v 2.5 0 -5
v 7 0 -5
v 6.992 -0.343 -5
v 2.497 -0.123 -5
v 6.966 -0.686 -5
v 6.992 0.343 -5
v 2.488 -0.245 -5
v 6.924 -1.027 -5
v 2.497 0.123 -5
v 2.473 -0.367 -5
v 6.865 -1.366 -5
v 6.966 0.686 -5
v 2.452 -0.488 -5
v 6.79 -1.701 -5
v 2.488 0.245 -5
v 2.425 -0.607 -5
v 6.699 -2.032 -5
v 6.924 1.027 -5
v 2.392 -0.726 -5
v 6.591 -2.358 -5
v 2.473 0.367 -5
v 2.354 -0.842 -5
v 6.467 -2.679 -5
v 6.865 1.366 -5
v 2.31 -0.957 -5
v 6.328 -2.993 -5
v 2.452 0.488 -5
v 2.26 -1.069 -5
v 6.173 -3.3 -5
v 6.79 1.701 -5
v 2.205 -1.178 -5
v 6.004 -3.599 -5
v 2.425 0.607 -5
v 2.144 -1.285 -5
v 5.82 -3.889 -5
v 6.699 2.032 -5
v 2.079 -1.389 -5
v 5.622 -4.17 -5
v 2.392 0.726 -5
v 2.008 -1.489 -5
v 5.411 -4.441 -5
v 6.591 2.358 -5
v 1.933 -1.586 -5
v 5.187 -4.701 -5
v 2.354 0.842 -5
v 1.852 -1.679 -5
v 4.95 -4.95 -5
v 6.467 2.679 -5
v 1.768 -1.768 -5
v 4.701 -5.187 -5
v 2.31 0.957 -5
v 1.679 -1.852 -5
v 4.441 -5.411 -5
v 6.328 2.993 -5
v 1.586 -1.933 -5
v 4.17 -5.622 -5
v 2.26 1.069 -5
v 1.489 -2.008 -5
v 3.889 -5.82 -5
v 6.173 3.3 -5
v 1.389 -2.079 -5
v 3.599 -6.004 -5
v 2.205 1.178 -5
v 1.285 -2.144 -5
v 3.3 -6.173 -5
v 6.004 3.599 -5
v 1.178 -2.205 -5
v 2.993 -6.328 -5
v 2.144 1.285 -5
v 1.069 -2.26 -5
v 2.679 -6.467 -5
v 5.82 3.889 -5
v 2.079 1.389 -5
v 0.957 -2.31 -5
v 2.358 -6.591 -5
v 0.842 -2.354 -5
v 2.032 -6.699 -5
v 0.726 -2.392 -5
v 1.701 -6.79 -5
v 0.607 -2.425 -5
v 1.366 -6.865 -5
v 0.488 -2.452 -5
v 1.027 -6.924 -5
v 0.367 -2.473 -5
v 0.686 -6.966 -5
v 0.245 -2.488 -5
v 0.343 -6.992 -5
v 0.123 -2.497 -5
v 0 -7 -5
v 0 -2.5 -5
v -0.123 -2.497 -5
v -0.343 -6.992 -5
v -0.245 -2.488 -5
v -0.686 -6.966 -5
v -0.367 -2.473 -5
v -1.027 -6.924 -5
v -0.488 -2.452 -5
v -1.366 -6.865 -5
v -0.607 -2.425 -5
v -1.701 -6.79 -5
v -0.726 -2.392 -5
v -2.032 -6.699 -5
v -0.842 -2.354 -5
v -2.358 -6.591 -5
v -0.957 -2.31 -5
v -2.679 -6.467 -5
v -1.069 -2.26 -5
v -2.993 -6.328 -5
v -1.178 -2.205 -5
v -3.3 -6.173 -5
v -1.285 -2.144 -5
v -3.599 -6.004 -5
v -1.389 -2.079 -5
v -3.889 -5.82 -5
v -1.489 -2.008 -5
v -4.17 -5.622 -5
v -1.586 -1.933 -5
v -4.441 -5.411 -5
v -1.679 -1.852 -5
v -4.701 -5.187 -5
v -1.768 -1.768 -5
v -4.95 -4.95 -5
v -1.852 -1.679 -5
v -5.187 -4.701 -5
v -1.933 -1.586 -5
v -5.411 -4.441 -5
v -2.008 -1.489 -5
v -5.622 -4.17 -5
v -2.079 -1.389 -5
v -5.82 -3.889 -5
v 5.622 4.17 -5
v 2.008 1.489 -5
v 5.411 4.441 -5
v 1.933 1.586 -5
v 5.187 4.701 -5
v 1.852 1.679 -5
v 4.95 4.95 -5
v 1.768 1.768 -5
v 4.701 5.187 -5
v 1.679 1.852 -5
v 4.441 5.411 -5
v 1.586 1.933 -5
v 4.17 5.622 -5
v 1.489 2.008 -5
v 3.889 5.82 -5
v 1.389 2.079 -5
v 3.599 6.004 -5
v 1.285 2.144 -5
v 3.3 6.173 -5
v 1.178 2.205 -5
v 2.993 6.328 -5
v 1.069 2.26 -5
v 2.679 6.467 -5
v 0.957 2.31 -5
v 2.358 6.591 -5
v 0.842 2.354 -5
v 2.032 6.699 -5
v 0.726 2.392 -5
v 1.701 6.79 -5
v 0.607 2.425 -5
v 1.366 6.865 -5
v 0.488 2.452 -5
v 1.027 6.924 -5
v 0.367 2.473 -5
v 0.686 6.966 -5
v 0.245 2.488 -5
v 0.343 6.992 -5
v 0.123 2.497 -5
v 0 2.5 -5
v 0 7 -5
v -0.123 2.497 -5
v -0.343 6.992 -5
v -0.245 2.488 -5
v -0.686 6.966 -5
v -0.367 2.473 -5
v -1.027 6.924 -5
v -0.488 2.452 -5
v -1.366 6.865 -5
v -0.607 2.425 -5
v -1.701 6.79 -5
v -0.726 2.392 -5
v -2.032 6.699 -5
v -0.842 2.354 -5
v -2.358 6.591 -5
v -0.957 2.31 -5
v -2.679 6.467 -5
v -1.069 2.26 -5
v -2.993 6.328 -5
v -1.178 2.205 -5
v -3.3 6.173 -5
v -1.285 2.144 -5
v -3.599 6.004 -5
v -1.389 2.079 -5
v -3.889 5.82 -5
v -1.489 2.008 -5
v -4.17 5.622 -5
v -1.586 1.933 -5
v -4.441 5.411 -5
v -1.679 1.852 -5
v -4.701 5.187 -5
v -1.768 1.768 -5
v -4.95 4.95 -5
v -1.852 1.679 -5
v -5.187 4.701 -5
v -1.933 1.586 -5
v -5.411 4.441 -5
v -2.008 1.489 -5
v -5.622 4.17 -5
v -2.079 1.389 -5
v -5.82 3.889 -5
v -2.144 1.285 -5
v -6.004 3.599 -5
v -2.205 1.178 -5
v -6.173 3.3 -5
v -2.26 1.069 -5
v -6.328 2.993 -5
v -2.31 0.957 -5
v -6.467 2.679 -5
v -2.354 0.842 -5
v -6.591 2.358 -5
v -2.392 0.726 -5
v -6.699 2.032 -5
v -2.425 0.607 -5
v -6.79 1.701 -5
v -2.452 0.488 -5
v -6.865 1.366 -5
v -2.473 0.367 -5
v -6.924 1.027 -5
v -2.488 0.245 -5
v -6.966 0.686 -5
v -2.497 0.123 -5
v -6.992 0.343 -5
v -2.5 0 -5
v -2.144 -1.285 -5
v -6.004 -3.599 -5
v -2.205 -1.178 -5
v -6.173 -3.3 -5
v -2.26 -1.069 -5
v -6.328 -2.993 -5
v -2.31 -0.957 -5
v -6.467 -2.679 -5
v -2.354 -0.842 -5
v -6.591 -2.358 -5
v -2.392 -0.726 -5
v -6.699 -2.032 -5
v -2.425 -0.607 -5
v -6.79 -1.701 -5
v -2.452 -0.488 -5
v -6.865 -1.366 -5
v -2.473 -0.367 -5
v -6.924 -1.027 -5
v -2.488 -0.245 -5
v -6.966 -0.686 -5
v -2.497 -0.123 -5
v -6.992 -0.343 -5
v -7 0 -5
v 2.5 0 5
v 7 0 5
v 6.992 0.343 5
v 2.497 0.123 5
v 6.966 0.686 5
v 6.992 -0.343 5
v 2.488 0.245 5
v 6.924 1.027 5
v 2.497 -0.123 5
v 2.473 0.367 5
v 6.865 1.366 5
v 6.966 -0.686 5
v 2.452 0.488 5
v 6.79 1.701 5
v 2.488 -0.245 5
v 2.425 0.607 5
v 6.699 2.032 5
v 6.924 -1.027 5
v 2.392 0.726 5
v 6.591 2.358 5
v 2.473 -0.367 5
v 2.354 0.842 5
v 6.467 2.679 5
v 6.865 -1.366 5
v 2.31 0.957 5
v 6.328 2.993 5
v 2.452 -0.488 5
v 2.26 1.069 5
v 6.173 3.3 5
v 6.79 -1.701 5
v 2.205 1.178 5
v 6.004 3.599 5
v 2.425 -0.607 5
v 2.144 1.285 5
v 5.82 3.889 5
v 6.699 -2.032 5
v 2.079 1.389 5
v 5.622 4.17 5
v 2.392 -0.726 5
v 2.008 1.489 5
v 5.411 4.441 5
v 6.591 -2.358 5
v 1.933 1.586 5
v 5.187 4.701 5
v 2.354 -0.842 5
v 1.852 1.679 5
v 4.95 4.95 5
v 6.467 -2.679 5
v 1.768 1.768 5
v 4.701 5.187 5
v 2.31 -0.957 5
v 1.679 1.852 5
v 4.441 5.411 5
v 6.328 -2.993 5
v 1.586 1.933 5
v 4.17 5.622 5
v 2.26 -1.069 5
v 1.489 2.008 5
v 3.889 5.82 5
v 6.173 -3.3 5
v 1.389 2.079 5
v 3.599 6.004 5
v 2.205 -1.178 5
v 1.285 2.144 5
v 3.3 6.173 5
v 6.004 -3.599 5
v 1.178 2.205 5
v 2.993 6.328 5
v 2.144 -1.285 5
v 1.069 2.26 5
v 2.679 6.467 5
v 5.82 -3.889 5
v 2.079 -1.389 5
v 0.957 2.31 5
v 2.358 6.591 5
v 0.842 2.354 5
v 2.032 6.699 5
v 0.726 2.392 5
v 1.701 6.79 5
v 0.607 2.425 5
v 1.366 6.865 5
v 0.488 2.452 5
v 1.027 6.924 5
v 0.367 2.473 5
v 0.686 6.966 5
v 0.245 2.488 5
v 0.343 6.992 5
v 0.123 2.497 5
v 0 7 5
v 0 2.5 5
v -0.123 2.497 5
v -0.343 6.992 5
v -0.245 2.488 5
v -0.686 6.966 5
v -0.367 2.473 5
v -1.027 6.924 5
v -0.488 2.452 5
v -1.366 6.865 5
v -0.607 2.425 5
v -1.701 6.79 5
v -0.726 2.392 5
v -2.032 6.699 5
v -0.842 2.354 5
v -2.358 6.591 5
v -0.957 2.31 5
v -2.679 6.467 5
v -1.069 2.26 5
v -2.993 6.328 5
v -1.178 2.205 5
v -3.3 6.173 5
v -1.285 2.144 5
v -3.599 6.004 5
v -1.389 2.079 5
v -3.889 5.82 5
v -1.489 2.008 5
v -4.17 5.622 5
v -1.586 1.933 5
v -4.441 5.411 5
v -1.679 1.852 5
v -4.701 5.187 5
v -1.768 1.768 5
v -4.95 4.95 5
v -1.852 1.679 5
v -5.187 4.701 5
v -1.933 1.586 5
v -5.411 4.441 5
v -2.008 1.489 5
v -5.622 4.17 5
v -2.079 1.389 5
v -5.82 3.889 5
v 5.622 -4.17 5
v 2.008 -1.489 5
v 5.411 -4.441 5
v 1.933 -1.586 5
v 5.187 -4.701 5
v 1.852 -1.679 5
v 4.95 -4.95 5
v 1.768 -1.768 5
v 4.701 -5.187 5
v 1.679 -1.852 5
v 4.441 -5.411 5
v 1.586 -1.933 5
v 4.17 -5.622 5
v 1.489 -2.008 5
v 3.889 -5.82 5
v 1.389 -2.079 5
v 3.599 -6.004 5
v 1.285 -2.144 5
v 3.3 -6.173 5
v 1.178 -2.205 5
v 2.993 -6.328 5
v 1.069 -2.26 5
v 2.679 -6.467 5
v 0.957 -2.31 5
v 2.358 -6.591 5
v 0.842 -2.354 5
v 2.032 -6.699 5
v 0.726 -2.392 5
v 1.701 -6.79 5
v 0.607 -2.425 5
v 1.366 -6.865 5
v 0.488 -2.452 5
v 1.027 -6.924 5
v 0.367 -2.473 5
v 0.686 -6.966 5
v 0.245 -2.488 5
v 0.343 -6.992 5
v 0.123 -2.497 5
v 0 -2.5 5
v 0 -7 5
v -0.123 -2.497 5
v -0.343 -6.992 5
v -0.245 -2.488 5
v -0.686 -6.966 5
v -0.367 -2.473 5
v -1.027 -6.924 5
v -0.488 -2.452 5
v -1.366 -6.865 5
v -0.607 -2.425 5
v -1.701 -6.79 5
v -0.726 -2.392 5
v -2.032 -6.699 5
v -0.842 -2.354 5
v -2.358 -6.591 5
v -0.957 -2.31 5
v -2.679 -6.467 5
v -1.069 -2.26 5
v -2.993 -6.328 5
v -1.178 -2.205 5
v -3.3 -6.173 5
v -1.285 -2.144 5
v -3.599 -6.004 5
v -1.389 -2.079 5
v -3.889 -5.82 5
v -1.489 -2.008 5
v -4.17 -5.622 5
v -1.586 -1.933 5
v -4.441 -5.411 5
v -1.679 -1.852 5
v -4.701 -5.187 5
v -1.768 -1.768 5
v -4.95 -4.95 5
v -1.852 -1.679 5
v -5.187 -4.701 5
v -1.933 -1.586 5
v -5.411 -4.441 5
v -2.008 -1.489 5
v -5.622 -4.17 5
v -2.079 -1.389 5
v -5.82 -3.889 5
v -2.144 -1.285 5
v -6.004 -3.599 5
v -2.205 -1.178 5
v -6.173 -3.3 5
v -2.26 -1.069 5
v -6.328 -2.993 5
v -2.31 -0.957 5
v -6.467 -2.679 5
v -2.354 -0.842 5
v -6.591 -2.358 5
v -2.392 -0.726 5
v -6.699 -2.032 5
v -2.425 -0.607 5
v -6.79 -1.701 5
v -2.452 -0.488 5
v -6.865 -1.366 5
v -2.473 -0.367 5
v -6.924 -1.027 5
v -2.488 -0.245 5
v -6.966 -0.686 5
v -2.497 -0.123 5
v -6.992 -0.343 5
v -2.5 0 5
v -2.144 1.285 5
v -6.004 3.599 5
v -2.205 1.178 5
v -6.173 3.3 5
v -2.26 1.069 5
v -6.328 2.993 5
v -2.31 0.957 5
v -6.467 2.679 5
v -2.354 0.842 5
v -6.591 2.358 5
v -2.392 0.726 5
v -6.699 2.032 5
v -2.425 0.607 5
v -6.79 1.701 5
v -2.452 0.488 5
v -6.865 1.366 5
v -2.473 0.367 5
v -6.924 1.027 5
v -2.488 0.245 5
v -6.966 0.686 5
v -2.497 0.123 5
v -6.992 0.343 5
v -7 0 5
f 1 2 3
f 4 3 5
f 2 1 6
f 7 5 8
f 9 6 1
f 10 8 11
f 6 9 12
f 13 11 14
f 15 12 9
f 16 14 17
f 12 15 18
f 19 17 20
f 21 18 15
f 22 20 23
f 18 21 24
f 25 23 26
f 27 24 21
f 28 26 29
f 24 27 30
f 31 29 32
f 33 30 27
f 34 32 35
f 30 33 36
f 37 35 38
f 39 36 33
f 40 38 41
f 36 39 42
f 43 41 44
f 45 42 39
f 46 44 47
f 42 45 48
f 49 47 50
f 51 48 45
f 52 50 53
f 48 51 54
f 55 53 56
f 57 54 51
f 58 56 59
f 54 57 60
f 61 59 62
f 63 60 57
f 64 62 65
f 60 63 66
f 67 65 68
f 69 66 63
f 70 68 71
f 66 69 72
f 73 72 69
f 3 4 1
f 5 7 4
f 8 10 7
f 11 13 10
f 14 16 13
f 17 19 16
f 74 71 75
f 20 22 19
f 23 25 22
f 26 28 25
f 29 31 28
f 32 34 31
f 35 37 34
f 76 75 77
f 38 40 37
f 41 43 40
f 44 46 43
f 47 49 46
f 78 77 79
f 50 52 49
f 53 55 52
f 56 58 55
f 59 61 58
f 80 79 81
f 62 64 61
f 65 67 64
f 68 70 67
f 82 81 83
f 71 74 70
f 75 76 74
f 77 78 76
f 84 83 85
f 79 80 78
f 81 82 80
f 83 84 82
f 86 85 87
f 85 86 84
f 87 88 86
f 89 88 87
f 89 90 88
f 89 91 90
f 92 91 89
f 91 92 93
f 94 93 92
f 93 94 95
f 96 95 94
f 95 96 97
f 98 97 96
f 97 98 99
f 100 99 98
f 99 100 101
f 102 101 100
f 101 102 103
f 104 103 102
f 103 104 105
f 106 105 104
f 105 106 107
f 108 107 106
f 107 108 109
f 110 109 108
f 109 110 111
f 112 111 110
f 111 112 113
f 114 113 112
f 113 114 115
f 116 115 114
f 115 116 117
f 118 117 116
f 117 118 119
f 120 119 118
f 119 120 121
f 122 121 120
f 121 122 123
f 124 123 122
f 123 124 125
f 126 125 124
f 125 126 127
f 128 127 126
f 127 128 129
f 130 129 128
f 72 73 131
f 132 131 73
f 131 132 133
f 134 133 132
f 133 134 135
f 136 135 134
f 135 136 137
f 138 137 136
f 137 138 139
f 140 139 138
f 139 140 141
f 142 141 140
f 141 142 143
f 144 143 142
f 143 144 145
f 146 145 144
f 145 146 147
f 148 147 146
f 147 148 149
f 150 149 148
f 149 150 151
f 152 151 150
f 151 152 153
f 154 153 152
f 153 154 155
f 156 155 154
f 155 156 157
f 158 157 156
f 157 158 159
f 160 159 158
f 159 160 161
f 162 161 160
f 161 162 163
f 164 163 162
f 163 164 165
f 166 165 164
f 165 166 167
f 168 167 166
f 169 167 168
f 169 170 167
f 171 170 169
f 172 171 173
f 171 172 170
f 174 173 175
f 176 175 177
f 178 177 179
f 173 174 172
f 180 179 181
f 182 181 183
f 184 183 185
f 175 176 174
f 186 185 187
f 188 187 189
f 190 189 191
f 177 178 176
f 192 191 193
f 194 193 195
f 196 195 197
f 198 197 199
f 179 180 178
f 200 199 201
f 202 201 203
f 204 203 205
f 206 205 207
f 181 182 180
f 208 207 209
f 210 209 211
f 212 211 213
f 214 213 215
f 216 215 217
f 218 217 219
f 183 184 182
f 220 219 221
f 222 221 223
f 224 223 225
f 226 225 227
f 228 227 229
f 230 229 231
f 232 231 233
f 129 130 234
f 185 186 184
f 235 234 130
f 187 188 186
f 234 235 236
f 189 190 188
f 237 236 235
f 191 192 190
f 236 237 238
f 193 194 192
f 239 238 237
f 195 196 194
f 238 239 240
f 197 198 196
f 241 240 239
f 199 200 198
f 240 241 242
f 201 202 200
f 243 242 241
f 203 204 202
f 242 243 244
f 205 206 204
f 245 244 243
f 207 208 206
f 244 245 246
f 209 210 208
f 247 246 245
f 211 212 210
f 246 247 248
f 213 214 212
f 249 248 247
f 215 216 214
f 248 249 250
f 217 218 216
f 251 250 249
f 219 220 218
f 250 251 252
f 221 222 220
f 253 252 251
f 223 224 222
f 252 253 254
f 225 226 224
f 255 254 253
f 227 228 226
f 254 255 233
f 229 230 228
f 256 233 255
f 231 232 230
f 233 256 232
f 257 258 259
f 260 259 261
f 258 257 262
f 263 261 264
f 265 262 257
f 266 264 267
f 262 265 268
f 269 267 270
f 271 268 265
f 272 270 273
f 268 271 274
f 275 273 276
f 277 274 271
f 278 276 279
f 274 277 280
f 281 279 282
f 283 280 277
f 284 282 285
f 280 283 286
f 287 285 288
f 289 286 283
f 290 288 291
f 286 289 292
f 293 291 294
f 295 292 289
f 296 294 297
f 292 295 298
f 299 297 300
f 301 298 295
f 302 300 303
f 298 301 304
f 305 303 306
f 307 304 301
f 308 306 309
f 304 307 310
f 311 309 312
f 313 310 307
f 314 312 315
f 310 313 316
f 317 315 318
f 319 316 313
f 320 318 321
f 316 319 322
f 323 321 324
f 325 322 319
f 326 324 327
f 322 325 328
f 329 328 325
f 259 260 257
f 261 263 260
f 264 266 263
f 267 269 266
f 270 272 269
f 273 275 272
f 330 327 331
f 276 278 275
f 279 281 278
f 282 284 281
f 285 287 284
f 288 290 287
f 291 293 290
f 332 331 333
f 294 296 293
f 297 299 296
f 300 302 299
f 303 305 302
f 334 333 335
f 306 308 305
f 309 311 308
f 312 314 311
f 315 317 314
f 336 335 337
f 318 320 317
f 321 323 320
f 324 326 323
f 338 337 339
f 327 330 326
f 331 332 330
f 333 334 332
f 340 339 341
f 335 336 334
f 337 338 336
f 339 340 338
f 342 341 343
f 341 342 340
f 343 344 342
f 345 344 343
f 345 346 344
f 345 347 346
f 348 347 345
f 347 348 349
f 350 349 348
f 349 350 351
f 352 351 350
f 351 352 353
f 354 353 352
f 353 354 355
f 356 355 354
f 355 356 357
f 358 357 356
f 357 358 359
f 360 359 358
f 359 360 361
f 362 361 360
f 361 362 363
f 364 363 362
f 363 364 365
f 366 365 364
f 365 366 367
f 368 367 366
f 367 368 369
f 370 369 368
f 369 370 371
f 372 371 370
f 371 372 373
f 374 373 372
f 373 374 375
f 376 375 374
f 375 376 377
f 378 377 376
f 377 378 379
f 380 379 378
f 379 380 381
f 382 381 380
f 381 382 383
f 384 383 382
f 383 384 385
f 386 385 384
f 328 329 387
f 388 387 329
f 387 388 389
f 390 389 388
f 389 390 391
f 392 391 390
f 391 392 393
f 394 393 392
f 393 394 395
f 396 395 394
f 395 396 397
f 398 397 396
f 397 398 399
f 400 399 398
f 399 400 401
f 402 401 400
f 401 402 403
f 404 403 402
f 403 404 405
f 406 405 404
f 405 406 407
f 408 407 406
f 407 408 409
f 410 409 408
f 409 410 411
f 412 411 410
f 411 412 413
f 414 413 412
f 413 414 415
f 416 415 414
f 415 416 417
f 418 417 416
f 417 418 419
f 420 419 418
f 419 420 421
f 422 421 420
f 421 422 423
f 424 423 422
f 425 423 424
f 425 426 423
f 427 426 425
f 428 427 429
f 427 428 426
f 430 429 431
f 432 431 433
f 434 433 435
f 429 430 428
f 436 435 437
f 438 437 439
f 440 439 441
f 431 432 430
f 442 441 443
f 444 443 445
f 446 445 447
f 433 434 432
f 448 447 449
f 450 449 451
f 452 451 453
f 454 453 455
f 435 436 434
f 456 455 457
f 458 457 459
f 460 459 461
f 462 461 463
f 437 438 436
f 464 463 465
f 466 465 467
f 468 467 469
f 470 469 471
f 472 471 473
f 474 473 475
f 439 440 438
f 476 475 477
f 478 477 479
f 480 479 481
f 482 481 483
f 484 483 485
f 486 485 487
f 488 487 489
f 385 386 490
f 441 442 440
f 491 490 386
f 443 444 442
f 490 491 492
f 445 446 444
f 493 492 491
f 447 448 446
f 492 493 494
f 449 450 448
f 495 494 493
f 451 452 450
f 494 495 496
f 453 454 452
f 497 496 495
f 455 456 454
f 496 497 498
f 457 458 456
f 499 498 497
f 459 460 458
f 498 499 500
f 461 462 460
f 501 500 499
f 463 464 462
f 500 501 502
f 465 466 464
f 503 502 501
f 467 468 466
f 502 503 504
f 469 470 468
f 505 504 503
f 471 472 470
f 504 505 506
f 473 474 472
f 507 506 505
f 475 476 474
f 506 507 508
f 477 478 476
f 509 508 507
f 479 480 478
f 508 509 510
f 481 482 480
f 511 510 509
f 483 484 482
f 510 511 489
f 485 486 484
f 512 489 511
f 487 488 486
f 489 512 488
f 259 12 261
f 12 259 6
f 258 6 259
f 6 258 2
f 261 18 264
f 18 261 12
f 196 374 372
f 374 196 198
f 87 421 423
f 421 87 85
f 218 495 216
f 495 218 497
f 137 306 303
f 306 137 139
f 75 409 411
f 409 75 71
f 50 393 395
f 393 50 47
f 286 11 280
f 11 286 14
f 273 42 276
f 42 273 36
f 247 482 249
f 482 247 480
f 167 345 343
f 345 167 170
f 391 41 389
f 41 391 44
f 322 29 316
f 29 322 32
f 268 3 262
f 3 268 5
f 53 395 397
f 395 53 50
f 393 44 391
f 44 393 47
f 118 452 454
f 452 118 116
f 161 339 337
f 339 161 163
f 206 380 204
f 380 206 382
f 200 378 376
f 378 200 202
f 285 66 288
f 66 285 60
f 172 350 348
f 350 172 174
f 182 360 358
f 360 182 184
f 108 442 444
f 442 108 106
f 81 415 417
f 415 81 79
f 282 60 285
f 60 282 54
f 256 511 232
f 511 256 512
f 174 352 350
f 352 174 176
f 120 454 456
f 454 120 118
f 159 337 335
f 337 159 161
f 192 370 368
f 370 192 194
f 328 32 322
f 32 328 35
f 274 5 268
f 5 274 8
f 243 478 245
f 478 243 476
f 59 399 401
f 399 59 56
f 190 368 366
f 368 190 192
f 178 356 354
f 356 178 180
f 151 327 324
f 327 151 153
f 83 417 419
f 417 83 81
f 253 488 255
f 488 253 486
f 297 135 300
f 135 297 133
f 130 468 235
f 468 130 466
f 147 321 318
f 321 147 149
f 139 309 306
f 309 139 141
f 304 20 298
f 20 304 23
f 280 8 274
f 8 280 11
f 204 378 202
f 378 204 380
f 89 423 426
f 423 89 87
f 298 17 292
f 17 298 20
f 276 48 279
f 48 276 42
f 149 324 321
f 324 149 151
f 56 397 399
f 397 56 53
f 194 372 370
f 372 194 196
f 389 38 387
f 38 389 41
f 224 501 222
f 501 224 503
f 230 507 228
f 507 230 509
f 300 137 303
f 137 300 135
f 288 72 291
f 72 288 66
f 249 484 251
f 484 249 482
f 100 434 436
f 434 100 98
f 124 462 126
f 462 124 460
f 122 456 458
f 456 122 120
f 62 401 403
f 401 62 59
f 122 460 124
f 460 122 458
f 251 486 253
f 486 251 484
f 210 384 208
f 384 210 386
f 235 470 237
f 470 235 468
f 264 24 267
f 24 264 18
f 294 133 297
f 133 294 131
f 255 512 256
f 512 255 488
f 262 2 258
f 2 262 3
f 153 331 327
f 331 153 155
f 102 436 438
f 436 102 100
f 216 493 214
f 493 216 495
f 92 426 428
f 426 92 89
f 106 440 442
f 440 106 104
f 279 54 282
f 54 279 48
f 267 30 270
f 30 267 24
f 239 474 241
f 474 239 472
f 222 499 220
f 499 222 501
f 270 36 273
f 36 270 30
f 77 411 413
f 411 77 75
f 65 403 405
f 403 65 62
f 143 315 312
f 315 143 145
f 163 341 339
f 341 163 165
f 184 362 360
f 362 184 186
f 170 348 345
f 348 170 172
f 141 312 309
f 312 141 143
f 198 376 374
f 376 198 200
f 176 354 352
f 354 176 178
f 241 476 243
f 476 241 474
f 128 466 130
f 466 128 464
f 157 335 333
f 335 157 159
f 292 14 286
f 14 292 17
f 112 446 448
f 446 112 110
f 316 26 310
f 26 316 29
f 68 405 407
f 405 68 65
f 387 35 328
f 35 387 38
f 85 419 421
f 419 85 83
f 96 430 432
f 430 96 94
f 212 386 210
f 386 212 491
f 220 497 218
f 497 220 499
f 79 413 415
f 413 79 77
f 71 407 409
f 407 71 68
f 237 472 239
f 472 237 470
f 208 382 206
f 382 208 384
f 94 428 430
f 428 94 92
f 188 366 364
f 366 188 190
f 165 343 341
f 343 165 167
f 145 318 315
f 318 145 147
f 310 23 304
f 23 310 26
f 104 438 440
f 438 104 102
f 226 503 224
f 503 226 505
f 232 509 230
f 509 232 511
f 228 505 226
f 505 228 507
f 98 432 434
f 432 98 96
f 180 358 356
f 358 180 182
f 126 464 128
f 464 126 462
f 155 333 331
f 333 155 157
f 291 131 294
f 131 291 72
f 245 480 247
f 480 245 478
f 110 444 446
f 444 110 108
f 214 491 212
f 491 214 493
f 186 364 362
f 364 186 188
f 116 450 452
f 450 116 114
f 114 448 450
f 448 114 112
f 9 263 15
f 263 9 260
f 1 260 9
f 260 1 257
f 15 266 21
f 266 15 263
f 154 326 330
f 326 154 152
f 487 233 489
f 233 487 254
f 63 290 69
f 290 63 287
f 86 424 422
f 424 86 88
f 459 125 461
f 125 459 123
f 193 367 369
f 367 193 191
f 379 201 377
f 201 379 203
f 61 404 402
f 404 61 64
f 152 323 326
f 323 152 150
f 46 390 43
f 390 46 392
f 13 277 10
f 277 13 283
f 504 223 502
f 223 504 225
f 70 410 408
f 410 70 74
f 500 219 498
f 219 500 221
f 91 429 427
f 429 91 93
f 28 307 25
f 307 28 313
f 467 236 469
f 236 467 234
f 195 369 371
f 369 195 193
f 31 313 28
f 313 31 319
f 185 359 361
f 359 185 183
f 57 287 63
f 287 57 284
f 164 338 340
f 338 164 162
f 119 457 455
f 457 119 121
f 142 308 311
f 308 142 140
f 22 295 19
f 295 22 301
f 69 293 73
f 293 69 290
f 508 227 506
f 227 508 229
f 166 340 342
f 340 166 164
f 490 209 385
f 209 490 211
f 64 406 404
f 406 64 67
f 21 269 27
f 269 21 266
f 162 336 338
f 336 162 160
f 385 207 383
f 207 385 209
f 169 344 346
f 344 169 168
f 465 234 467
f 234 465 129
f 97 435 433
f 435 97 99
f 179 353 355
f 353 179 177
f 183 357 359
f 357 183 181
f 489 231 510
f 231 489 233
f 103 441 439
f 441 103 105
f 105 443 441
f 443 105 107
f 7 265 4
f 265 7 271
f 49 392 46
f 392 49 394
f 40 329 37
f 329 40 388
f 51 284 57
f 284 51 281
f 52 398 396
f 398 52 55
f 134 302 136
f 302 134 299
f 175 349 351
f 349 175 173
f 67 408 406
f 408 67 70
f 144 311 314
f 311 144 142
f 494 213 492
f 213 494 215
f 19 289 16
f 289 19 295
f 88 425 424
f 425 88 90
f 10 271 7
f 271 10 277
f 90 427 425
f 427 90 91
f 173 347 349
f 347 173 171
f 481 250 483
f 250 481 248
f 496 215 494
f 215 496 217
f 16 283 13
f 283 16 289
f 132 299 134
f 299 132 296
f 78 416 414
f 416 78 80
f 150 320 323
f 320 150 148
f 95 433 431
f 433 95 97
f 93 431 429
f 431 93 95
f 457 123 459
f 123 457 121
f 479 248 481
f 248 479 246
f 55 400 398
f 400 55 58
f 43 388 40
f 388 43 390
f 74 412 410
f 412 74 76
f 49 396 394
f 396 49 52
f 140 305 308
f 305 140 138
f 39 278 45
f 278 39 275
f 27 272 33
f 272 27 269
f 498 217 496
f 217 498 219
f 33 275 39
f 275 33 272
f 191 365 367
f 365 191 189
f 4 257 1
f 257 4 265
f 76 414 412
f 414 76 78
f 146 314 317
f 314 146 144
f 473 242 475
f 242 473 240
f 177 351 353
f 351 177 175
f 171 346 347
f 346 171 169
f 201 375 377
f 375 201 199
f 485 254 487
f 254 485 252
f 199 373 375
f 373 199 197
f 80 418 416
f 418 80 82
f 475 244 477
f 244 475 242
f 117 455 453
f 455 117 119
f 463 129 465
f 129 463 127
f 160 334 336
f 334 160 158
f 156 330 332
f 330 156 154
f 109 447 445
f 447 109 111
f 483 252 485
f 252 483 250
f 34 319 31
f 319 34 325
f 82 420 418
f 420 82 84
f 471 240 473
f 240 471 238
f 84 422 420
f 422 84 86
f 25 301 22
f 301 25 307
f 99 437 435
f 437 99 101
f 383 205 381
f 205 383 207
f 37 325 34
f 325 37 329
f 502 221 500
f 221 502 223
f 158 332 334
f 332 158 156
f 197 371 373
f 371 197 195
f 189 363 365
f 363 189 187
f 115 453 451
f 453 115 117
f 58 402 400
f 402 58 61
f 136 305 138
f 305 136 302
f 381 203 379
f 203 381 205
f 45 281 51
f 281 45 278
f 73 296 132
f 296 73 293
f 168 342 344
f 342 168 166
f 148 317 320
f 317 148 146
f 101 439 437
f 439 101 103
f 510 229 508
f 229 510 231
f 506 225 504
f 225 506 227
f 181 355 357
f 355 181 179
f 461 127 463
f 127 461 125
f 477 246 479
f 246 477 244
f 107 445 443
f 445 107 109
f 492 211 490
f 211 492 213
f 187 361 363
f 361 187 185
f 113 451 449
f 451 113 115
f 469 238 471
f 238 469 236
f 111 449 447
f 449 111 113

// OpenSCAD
$fn=128;

teeth = 16;
pitch_d = 9.75;          // mm
pitch_r = pitch_d/2;

pulley_w = 10;           // mm
hub_d = 14;              // mm
bore_d = 5;              // mm

tooth_height = 1.2;      // mm (radial)
tooth_tip_width = 1.2;   // mm (tangential at tip)
tooth_root_width = 2.0;  // mm (tangential at root)

root_r = pitch_r - tooth_height*0.55;
tip_r  = pitch_r + tooth_height*0.65;

module tooth2d() {
    polygon(points=[
        [root_r, -tooth_root_width/2],
        [root_r,  tooth_root_width/2],
        [tip_r,   tooth_tip_width/2],
        [tip_r,  -tooth_tip_width/2]
    ]);
}

module teeth_ring() {
    for(i=[0:teeth-1]) {
        rotate(i*360/teeth)
            linear_extrude(height=pulley_w, center=true, convexity=10)
                tooth2d();
    }
}

module body() {
    cylinder(d=hub_d, h=pulley_w, center=true);
}

difference() {
    union() {
        body();
        teeth_ring();
    }
    cylinder(d=bore_d, h=pulley_w+2, center=true);
}
